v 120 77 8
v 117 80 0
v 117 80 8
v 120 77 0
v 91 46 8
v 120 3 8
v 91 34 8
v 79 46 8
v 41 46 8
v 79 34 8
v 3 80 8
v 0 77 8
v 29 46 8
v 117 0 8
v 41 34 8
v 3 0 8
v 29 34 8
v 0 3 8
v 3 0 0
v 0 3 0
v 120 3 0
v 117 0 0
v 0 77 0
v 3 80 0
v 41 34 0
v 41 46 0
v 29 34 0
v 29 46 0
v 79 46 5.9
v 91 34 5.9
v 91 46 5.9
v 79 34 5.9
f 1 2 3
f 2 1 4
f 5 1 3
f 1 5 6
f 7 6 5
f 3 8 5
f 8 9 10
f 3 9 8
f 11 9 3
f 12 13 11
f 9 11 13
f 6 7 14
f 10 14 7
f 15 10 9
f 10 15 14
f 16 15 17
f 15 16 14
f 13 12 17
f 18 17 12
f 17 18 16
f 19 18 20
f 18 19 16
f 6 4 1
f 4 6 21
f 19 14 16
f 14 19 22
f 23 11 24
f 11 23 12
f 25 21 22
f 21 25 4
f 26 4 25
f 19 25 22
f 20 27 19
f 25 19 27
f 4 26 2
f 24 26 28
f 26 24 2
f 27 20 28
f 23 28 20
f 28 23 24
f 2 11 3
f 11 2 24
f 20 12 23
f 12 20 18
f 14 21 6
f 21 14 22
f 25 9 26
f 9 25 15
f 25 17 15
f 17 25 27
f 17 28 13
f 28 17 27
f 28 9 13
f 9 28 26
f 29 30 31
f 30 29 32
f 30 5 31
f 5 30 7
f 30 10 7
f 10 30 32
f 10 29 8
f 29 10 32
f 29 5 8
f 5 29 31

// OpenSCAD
$fn = 32;

// ----------------------------------------------------------------------
// Windowed plate: 2 voids, 120 x 80 x 8 mm
// ----------------------------------------------------------------------

// --- parameters (mm) ---
plate_l = 120;            // plate length, X
plate_w = 80;             // plate width, Y
plate_t = 8;              // plate thickness, Z
edge_margin = 10;         // wall from the plate edge to any window
windows = 2;              // number of windows in the row
win_l = 12;               // window length
win_w = 12;               // window width
win_pitch = 50;           // window pitch along X
depth_1 = 8;              // depth of void 1 (full thickness = through)
depth_2 = 2.1;            // depth of void 2 (full thickness = through)
corner_c = 3;             // corner chamfer of the plate

profile = [[3, 0], [117, 0], [120, 3], [120, 77], [117, 80], [3, 80], [0, 77], [0, 3]];  // primary outline, 8 points, counter clockwise
void_1 = [[29, 34], [41, 34], [41, 46], [29, 46]];  // window 1 of the row, 4 points
void_2 = [[79, 34], [91, 34], [91, 46], [79, 46]];  // window 2 of the row, 4 points

// --- the one profile operation ---
difference() {
  linear_extrude(height = plate_t) polygon(points = profile);
  translate([0, 0, -1])
    linear_extrude(height = plate_t + 2) polygon(points = void_1);
  translate([0, 0, plate_t - depth_2])
    linear_extrude(height = depth_2 + 1) polygon(points = void_2);
}
